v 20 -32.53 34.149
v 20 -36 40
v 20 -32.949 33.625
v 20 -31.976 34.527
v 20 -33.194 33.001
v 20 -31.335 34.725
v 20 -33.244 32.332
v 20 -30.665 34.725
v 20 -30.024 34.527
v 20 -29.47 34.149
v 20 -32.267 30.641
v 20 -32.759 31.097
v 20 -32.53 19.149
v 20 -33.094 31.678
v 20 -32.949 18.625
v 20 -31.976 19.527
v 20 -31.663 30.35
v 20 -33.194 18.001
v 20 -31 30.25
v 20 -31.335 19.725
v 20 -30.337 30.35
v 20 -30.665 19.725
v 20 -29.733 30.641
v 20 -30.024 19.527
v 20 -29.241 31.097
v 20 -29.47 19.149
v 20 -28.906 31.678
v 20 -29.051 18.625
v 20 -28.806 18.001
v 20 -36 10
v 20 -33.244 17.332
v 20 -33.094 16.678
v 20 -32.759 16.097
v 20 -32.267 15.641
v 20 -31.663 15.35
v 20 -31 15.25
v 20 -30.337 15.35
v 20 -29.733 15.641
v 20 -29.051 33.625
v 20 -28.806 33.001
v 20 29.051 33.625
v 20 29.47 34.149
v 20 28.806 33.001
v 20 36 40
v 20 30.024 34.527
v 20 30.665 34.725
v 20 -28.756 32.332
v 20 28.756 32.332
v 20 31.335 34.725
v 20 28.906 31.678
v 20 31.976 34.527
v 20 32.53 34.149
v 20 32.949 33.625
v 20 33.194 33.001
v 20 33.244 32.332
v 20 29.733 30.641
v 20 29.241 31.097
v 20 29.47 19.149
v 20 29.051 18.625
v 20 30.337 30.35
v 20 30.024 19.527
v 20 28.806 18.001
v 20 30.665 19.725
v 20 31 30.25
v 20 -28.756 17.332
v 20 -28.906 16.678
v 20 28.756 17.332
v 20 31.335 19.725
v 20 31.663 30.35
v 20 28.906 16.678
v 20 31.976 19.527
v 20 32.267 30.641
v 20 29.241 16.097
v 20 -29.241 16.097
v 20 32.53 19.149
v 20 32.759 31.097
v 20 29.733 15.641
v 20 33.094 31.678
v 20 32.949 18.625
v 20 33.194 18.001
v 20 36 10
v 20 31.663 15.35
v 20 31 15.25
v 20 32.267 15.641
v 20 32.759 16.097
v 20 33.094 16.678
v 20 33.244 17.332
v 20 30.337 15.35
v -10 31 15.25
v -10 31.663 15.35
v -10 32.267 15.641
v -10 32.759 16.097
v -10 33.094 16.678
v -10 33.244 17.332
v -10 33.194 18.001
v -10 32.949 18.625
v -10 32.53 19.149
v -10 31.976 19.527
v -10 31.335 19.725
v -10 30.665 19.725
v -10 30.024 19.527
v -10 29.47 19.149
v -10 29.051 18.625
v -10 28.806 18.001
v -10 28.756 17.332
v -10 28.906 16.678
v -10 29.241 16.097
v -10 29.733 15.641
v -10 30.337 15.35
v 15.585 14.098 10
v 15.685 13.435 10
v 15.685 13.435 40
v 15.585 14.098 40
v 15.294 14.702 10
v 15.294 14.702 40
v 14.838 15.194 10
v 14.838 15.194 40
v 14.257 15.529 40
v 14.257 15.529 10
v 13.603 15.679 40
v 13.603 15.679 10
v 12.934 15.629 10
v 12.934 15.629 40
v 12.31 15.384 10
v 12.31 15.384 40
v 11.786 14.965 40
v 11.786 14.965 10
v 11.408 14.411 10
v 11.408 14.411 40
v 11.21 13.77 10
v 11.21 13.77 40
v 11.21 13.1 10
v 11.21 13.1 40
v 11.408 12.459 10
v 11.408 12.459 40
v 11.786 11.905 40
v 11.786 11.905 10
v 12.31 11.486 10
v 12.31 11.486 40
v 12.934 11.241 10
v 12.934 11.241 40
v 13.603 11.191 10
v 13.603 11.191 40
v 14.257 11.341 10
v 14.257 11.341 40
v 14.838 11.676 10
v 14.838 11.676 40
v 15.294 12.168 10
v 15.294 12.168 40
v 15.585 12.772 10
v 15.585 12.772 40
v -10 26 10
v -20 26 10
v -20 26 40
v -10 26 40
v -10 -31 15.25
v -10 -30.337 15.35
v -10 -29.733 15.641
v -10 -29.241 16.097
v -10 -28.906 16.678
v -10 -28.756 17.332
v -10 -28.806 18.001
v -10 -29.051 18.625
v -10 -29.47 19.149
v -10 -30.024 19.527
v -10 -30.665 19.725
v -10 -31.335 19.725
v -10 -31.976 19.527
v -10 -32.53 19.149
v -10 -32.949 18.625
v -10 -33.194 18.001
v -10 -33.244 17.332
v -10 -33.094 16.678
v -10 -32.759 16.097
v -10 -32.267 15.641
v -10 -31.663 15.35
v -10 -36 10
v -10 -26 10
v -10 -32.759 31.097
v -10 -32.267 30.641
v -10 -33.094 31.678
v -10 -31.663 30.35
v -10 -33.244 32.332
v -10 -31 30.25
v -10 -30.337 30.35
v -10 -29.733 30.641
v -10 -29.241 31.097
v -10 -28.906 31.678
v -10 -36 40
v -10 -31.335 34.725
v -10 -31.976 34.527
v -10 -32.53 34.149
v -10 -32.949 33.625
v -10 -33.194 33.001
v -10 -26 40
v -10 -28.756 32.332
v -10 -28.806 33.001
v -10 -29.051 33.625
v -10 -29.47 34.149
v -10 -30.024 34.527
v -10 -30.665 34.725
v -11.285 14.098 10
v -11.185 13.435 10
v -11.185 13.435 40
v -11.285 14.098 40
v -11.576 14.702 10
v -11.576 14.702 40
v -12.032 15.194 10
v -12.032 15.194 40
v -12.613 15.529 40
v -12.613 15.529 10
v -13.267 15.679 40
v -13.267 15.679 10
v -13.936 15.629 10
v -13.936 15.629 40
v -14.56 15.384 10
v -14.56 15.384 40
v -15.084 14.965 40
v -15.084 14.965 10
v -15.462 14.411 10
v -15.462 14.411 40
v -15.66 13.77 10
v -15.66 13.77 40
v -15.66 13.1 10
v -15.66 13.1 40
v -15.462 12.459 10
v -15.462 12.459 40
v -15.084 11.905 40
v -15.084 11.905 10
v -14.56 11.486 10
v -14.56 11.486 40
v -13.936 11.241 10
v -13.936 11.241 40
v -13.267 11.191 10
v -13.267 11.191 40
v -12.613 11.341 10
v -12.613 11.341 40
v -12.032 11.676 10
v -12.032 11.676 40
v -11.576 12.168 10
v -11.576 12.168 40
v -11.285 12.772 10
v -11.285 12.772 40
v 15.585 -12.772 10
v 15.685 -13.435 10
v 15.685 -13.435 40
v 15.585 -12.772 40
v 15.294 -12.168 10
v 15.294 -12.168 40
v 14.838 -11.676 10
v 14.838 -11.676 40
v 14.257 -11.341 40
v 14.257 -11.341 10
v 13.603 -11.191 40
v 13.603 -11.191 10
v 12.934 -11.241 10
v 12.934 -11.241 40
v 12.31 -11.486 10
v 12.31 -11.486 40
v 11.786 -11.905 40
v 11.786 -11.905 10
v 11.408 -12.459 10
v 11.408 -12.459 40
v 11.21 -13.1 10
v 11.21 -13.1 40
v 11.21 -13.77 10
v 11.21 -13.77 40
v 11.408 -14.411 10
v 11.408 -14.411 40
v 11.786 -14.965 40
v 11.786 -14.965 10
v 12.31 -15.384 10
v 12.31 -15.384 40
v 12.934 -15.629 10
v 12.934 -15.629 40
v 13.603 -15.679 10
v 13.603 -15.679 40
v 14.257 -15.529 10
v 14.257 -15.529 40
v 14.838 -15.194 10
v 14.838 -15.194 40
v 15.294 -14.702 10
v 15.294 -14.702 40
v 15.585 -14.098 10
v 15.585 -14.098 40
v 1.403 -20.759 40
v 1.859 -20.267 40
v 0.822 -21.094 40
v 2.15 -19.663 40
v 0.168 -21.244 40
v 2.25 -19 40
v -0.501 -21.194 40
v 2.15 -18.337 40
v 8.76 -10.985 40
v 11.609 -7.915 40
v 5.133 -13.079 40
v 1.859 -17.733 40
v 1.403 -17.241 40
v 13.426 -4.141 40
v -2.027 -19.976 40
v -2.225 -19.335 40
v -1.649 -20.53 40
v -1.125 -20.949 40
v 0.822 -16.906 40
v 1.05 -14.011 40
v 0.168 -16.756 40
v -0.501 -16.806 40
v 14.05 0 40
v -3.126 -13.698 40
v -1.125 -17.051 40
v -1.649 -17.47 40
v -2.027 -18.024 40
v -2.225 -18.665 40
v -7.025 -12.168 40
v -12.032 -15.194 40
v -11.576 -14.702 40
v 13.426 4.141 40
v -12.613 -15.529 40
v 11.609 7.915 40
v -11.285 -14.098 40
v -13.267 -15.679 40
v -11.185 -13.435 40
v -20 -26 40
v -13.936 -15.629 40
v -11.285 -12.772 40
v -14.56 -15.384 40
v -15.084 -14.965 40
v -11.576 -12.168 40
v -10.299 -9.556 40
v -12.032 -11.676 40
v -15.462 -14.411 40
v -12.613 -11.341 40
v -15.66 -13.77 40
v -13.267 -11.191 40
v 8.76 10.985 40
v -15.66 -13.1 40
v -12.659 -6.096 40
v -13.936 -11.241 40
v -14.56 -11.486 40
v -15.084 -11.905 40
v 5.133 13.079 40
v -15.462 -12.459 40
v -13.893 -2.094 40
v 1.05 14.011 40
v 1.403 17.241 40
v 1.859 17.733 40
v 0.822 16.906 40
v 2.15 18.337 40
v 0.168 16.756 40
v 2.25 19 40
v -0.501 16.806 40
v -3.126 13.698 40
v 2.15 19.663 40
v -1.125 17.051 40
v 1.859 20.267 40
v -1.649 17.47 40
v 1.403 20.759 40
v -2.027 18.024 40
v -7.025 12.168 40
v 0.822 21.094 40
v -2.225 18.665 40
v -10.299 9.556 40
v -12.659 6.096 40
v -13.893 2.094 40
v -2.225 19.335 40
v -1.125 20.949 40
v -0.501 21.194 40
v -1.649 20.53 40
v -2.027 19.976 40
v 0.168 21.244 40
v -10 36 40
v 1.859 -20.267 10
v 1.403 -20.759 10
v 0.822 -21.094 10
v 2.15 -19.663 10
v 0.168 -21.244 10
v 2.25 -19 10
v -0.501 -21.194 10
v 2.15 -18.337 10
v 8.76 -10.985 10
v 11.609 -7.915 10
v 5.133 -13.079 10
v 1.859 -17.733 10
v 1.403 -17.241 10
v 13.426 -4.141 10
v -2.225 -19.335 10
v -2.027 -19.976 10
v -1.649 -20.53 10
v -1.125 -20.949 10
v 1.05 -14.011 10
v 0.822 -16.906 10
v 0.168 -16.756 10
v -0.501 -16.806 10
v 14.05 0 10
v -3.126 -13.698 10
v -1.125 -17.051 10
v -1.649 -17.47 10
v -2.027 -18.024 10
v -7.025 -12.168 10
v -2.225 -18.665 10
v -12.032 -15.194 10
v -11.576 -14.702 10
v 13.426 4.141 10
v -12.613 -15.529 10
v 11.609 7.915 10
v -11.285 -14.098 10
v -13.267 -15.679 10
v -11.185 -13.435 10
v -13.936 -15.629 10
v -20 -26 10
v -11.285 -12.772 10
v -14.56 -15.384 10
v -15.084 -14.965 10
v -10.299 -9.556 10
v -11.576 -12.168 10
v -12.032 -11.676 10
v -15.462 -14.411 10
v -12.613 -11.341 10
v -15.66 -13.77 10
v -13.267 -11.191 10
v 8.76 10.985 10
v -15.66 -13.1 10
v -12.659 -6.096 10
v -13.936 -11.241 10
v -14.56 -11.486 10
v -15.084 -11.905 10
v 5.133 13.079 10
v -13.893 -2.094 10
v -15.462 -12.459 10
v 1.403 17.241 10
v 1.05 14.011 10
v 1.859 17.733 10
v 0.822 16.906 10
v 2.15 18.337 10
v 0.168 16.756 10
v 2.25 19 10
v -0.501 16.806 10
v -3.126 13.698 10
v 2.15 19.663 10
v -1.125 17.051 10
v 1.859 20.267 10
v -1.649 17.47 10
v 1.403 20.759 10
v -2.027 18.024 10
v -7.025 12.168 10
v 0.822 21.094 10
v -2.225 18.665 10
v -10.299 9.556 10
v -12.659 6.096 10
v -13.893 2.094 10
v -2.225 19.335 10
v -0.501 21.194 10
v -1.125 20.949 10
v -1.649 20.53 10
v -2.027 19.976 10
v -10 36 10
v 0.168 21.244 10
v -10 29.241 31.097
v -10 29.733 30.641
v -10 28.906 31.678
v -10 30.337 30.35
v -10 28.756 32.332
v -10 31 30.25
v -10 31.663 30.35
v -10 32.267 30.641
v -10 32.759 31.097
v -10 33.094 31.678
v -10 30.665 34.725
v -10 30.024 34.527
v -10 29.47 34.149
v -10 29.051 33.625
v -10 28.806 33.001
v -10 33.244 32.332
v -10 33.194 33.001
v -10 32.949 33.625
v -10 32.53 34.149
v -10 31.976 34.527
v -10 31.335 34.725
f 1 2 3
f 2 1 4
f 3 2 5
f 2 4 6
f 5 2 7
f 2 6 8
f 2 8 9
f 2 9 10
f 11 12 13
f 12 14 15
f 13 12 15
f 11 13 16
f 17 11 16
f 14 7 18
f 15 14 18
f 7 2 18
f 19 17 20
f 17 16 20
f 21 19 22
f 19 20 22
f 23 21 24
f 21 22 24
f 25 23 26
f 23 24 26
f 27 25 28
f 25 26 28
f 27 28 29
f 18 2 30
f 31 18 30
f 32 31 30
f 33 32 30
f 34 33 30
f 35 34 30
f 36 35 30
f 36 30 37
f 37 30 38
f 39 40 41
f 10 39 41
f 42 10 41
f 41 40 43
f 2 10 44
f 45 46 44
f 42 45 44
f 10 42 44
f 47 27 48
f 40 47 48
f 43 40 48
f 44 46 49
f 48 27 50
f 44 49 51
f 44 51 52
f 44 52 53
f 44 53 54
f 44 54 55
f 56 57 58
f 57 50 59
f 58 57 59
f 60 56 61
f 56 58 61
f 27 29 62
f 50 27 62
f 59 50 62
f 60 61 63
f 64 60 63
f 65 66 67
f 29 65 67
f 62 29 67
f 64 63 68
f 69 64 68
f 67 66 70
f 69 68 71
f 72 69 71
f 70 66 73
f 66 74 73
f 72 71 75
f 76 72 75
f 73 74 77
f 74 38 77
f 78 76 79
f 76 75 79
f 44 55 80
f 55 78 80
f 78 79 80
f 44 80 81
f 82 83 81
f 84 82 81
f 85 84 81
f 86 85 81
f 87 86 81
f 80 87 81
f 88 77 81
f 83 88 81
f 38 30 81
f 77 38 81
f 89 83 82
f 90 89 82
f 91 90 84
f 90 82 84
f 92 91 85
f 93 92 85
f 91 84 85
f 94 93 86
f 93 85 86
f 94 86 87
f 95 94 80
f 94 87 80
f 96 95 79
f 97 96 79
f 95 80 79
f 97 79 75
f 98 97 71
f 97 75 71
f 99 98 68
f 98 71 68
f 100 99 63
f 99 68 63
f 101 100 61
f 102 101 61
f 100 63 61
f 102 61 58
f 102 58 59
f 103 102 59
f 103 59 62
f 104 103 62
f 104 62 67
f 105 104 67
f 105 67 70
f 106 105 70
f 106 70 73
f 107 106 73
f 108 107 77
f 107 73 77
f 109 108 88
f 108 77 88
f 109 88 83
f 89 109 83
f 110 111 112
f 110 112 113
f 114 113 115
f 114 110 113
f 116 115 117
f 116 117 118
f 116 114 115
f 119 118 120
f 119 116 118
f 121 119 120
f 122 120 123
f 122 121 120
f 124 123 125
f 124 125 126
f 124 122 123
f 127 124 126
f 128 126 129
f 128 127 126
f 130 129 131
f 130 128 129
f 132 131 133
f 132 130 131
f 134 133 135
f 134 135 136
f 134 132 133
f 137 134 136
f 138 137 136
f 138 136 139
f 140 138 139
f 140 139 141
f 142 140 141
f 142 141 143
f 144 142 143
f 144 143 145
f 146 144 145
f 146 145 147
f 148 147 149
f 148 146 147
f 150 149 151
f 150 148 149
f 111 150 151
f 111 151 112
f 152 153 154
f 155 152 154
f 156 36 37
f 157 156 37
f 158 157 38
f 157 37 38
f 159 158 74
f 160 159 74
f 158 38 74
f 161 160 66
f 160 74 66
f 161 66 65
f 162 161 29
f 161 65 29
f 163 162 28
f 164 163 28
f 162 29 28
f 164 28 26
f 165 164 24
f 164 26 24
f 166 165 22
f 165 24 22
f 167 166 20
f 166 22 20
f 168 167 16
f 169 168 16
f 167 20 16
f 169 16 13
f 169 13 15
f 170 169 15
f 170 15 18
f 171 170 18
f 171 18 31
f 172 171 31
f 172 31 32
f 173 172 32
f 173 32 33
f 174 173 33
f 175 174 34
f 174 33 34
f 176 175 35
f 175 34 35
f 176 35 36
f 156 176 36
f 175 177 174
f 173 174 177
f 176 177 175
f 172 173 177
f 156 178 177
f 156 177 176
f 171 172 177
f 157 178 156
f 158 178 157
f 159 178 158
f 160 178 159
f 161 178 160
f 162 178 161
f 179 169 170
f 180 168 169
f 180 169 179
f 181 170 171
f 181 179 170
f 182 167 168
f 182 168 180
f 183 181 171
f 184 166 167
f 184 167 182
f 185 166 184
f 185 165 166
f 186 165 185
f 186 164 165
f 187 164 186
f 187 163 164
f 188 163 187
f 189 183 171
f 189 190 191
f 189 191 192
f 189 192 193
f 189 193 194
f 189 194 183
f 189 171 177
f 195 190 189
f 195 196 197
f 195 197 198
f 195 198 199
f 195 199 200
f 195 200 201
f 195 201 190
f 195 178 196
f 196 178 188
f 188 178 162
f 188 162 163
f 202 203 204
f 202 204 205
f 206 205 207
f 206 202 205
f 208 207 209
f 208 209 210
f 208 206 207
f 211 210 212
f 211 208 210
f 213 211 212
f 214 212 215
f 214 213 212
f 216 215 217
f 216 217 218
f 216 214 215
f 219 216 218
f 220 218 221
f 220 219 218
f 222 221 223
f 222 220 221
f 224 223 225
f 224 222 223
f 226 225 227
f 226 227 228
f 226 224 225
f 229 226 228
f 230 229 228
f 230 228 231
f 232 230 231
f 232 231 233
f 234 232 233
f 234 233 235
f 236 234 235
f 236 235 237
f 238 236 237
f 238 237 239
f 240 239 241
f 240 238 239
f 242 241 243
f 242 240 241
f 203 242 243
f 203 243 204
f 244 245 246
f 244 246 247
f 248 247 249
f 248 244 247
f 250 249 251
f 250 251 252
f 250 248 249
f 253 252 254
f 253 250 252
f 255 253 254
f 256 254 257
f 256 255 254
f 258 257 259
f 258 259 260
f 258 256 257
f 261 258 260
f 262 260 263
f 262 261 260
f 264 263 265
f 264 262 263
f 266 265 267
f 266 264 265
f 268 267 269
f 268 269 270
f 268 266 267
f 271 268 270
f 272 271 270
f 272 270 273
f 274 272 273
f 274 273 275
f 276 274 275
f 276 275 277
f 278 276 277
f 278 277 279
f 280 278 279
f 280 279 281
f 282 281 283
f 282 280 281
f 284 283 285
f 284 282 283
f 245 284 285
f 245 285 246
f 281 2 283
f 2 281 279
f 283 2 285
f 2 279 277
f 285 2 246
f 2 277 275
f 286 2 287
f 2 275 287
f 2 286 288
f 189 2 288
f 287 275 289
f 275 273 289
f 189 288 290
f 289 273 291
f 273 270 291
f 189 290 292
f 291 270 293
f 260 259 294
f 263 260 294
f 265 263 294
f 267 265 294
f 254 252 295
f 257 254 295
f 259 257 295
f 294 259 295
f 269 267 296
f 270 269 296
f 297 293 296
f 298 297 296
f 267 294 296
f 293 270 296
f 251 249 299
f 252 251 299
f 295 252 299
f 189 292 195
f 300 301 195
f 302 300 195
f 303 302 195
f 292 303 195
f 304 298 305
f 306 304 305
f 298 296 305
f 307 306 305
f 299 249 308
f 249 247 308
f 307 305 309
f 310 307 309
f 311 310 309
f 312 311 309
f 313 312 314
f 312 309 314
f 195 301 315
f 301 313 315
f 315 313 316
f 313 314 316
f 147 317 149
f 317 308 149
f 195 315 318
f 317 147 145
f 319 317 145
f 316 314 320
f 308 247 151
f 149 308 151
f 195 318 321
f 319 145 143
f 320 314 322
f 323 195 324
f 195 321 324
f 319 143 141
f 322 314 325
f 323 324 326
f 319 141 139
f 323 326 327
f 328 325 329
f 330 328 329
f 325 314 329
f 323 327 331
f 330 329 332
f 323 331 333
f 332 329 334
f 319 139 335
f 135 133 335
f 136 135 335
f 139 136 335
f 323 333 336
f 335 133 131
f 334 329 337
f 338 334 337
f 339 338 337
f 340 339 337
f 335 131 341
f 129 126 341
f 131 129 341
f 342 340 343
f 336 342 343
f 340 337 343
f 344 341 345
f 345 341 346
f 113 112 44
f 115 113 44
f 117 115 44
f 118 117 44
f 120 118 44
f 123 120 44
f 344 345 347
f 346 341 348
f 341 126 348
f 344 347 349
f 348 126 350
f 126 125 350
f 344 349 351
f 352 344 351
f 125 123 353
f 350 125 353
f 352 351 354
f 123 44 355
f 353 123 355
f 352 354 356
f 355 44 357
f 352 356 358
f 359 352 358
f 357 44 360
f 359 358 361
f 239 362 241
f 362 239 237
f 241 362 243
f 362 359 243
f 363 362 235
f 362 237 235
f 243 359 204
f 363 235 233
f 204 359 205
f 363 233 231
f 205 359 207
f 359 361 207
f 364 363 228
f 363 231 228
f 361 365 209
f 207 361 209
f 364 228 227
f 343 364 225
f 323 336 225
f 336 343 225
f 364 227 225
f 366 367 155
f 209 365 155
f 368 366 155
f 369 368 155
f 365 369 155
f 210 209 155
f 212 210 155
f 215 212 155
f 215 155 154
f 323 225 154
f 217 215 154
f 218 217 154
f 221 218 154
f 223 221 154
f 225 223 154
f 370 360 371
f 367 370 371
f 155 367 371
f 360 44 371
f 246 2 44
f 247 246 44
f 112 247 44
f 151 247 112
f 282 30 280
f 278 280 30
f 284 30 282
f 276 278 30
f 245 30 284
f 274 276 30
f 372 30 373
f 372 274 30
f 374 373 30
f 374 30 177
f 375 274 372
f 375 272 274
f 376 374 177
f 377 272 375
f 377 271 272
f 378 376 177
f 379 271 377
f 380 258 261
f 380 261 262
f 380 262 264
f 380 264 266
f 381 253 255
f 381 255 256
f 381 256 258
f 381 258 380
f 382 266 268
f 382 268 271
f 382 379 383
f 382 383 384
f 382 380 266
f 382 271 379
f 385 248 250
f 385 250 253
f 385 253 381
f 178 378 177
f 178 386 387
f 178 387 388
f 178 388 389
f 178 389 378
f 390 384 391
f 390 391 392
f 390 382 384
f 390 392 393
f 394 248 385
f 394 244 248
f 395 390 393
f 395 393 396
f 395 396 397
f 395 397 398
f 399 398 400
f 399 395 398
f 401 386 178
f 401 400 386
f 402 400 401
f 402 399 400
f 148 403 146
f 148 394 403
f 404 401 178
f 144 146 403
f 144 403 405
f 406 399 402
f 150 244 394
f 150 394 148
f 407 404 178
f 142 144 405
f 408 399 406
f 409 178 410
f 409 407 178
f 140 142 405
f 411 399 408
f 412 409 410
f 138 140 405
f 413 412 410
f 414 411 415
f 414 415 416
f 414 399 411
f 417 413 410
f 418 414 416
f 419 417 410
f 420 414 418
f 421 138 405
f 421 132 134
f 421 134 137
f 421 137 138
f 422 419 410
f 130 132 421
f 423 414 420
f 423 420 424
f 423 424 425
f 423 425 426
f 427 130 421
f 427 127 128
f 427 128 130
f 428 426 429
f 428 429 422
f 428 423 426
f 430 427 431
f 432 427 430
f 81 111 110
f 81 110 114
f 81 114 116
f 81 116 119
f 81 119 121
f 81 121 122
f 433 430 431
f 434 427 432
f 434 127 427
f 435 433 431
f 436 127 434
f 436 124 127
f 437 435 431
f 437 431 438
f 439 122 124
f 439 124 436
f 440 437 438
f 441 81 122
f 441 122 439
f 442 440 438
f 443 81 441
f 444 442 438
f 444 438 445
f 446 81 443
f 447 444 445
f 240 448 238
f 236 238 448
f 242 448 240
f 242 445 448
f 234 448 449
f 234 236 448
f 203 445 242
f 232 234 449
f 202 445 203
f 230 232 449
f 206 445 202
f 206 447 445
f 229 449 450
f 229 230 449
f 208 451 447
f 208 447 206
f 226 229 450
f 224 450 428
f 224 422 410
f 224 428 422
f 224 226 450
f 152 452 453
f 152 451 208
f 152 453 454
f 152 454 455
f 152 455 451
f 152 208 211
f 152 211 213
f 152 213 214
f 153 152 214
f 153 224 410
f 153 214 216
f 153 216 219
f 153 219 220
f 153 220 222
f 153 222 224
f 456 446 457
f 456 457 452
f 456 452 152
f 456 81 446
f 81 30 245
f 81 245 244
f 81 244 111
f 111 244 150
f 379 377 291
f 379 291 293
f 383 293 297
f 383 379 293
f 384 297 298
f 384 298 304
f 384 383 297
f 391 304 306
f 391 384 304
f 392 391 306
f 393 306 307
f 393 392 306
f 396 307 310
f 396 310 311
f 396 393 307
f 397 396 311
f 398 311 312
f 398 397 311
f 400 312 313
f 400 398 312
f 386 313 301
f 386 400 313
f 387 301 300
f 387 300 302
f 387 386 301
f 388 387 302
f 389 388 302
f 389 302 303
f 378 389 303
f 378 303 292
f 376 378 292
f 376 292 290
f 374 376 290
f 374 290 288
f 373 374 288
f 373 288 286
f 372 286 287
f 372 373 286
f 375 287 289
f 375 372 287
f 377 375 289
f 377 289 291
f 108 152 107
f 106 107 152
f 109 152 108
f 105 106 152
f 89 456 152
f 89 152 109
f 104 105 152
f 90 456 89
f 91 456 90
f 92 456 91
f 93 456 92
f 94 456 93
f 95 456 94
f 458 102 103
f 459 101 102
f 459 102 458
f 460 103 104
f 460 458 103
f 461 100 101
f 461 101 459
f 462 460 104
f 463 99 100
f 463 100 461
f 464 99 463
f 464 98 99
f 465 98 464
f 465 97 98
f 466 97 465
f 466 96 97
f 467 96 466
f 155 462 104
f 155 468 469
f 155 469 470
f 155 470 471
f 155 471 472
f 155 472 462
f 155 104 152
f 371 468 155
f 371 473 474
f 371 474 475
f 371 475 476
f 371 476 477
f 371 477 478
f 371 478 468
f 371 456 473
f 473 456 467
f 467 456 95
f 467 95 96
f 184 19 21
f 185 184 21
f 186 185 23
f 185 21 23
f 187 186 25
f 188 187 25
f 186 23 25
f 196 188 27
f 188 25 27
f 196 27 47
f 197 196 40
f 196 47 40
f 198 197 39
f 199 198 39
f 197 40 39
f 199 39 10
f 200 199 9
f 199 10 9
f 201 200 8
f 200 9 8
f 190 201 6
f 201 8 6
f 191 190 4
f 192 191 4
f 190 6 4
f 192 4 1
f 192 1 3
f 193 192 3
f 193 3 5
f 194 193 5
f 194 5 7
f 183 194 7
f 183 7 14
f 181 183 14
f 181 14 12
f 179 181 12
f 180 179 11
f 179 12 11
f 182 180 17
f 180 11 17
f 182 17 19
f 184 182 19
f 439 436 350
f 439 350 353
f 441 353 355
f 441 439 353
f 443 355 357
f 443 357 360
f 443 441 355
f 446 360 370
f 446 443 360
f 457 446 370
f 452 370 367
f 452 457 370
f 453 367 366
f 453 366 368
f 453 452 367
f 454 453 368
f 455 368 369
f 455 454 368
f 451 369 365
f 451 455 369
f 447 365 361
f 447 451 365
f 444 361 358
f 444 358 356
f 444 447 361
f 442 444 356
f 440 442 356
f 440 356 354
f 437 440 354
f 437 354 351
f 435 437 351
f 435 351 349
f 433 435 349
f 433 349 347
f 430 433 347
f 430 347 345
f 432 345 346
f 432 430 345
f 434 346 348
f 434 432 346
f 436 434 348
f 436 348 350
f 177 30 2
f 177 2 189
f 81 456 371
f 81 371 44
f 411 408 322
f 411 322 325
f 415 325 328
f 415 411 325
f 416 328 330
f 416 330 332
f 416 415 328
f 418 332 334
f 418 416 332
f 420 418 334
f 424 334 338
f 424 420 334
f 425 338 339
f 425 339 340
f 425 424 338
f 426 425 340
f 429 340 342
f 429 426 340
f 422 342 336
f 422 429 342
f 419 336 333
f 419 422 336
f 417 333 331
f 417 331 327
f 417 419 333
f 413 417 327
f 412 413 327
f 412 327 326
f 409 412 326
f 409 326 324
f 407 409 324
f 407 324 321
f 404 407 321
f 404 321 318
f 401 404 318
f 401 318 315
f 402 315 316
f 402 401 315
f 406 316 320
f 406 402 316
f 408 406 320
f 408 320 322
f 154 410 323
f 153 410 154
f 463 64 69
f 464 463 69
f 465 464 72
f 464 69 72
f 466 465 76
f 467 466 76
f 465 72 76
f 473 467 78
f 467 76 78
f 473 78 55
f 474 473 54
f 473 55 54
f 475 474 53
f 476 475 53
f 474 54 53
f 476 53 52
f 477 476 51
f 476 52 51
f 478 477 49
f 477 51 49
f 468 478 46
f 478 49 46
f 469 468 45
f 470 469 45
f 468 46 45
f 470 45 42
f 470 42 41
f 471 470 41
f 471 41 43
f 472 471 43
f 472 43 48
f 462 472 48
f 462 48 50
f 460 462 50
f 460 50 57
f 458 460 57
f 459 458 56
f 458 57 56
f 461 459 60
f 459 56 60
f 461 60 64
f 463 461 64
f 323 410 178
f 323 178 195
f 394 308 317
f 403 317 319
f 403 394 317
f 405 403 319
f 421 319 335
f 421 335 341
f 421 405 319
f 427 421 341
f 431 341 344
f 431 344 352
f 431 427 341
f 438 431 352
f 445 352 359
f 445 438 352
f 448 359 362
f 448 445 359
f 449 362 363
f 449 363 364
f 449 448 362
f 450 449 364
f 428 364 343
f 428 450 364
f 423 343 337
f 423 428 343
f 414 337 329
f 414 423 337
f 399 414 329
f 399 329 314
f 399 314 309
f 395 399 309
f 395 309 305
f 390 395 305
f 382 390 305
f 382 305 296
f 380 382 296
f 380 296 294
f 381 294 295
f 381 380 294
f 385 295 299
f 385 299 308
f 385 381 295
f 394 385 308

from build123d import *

# Parameters (mm, degrees)
SKETCH2_R          = 2.25
SKETCH2_R_2        = 14.05
EXTRUDE6_DEPTH     = 30
SKETCH3_R          = 2.25
CUT_EXTRUDE1_DEPTH = 30
SKETCH4_W          = 30
SKETCH4_H          = 10
CUT_EXTRUDE2_DEPTH = 10


with BuildPart() as part:
    # Sketch2 → Extrude6 (new body)
    with BuildSketch(Plane.XY.offset(10)):
        Polygon((20, 0), (20, -36), (-20, -36), (-20, 36), (20, 36), align=None)
        with Locations((13.435028843, 13.435028843)):
            Circle(SKETCH2_R, mode=Mode.SUBTRACT)
        with Locations((0, 19)):
            Circle(SKETCH2_R, mode=Mode.SUBTRACT)
        with Locations((-13.435028843, 13.435028843)):
            Circle(SKETCH2_R, mode=Mode.SUBTRACT)
        with Locations((-13.435028843, -13.435028843)):
            Circle(SKETCH2_R, mode=Mode.SUBTRACT)
        with Locations((0, -19)):
            Circle(SKETCH2_R, mode=Mode.SUBTRACT)
        with Locations((13.435028843, -13.435028843)):
            Circle(SKETCH2_R, mode=Mode.SUBTRACT)
        Circle(SKETCH2_R_2, mode=Mode.SUBTRACT)
    extrude(amount=EXTRUDE6_DEPTH)

    # Sketch3 → Cut-Extrude1 (cut)
    with BuildSketch(Plane(origin=(20, 0, 0), x_dir=(0, 0, -1), z_dir=(1, 0, 0))):
        with Locations((-32.5, -31)):
            Circle(SKETCH3_R)
        with Locations((-17.5, -31)):
            Circle(SKETCH3_R)
        with Locations((-32.5, 31)):
            Circle(SKETCH3_R)
        with Locations((-17.5, 31)):
            Circle(SKETCH3_R)
    extrude(amount=-CUT_EXTRUDE1_DEPTH, mode=Mode.SUBTRACT)

    # Sketch4 → Cut-Extrude2 (cut)
    with BuildSketch(Plane.ZY.offset(20)):
        with Locations((25, 31)):
            Rectangle(SKETCH4_W, SKETCH4_H)
        with Locations((25, -31)):
            Rectangle(SKETCH4_W, SKETCH4_H)
    extrude(amount=-CUT_EXTRUDE2_DEPTH, mode=Mode.SUBTRACT)


solid = part.part
